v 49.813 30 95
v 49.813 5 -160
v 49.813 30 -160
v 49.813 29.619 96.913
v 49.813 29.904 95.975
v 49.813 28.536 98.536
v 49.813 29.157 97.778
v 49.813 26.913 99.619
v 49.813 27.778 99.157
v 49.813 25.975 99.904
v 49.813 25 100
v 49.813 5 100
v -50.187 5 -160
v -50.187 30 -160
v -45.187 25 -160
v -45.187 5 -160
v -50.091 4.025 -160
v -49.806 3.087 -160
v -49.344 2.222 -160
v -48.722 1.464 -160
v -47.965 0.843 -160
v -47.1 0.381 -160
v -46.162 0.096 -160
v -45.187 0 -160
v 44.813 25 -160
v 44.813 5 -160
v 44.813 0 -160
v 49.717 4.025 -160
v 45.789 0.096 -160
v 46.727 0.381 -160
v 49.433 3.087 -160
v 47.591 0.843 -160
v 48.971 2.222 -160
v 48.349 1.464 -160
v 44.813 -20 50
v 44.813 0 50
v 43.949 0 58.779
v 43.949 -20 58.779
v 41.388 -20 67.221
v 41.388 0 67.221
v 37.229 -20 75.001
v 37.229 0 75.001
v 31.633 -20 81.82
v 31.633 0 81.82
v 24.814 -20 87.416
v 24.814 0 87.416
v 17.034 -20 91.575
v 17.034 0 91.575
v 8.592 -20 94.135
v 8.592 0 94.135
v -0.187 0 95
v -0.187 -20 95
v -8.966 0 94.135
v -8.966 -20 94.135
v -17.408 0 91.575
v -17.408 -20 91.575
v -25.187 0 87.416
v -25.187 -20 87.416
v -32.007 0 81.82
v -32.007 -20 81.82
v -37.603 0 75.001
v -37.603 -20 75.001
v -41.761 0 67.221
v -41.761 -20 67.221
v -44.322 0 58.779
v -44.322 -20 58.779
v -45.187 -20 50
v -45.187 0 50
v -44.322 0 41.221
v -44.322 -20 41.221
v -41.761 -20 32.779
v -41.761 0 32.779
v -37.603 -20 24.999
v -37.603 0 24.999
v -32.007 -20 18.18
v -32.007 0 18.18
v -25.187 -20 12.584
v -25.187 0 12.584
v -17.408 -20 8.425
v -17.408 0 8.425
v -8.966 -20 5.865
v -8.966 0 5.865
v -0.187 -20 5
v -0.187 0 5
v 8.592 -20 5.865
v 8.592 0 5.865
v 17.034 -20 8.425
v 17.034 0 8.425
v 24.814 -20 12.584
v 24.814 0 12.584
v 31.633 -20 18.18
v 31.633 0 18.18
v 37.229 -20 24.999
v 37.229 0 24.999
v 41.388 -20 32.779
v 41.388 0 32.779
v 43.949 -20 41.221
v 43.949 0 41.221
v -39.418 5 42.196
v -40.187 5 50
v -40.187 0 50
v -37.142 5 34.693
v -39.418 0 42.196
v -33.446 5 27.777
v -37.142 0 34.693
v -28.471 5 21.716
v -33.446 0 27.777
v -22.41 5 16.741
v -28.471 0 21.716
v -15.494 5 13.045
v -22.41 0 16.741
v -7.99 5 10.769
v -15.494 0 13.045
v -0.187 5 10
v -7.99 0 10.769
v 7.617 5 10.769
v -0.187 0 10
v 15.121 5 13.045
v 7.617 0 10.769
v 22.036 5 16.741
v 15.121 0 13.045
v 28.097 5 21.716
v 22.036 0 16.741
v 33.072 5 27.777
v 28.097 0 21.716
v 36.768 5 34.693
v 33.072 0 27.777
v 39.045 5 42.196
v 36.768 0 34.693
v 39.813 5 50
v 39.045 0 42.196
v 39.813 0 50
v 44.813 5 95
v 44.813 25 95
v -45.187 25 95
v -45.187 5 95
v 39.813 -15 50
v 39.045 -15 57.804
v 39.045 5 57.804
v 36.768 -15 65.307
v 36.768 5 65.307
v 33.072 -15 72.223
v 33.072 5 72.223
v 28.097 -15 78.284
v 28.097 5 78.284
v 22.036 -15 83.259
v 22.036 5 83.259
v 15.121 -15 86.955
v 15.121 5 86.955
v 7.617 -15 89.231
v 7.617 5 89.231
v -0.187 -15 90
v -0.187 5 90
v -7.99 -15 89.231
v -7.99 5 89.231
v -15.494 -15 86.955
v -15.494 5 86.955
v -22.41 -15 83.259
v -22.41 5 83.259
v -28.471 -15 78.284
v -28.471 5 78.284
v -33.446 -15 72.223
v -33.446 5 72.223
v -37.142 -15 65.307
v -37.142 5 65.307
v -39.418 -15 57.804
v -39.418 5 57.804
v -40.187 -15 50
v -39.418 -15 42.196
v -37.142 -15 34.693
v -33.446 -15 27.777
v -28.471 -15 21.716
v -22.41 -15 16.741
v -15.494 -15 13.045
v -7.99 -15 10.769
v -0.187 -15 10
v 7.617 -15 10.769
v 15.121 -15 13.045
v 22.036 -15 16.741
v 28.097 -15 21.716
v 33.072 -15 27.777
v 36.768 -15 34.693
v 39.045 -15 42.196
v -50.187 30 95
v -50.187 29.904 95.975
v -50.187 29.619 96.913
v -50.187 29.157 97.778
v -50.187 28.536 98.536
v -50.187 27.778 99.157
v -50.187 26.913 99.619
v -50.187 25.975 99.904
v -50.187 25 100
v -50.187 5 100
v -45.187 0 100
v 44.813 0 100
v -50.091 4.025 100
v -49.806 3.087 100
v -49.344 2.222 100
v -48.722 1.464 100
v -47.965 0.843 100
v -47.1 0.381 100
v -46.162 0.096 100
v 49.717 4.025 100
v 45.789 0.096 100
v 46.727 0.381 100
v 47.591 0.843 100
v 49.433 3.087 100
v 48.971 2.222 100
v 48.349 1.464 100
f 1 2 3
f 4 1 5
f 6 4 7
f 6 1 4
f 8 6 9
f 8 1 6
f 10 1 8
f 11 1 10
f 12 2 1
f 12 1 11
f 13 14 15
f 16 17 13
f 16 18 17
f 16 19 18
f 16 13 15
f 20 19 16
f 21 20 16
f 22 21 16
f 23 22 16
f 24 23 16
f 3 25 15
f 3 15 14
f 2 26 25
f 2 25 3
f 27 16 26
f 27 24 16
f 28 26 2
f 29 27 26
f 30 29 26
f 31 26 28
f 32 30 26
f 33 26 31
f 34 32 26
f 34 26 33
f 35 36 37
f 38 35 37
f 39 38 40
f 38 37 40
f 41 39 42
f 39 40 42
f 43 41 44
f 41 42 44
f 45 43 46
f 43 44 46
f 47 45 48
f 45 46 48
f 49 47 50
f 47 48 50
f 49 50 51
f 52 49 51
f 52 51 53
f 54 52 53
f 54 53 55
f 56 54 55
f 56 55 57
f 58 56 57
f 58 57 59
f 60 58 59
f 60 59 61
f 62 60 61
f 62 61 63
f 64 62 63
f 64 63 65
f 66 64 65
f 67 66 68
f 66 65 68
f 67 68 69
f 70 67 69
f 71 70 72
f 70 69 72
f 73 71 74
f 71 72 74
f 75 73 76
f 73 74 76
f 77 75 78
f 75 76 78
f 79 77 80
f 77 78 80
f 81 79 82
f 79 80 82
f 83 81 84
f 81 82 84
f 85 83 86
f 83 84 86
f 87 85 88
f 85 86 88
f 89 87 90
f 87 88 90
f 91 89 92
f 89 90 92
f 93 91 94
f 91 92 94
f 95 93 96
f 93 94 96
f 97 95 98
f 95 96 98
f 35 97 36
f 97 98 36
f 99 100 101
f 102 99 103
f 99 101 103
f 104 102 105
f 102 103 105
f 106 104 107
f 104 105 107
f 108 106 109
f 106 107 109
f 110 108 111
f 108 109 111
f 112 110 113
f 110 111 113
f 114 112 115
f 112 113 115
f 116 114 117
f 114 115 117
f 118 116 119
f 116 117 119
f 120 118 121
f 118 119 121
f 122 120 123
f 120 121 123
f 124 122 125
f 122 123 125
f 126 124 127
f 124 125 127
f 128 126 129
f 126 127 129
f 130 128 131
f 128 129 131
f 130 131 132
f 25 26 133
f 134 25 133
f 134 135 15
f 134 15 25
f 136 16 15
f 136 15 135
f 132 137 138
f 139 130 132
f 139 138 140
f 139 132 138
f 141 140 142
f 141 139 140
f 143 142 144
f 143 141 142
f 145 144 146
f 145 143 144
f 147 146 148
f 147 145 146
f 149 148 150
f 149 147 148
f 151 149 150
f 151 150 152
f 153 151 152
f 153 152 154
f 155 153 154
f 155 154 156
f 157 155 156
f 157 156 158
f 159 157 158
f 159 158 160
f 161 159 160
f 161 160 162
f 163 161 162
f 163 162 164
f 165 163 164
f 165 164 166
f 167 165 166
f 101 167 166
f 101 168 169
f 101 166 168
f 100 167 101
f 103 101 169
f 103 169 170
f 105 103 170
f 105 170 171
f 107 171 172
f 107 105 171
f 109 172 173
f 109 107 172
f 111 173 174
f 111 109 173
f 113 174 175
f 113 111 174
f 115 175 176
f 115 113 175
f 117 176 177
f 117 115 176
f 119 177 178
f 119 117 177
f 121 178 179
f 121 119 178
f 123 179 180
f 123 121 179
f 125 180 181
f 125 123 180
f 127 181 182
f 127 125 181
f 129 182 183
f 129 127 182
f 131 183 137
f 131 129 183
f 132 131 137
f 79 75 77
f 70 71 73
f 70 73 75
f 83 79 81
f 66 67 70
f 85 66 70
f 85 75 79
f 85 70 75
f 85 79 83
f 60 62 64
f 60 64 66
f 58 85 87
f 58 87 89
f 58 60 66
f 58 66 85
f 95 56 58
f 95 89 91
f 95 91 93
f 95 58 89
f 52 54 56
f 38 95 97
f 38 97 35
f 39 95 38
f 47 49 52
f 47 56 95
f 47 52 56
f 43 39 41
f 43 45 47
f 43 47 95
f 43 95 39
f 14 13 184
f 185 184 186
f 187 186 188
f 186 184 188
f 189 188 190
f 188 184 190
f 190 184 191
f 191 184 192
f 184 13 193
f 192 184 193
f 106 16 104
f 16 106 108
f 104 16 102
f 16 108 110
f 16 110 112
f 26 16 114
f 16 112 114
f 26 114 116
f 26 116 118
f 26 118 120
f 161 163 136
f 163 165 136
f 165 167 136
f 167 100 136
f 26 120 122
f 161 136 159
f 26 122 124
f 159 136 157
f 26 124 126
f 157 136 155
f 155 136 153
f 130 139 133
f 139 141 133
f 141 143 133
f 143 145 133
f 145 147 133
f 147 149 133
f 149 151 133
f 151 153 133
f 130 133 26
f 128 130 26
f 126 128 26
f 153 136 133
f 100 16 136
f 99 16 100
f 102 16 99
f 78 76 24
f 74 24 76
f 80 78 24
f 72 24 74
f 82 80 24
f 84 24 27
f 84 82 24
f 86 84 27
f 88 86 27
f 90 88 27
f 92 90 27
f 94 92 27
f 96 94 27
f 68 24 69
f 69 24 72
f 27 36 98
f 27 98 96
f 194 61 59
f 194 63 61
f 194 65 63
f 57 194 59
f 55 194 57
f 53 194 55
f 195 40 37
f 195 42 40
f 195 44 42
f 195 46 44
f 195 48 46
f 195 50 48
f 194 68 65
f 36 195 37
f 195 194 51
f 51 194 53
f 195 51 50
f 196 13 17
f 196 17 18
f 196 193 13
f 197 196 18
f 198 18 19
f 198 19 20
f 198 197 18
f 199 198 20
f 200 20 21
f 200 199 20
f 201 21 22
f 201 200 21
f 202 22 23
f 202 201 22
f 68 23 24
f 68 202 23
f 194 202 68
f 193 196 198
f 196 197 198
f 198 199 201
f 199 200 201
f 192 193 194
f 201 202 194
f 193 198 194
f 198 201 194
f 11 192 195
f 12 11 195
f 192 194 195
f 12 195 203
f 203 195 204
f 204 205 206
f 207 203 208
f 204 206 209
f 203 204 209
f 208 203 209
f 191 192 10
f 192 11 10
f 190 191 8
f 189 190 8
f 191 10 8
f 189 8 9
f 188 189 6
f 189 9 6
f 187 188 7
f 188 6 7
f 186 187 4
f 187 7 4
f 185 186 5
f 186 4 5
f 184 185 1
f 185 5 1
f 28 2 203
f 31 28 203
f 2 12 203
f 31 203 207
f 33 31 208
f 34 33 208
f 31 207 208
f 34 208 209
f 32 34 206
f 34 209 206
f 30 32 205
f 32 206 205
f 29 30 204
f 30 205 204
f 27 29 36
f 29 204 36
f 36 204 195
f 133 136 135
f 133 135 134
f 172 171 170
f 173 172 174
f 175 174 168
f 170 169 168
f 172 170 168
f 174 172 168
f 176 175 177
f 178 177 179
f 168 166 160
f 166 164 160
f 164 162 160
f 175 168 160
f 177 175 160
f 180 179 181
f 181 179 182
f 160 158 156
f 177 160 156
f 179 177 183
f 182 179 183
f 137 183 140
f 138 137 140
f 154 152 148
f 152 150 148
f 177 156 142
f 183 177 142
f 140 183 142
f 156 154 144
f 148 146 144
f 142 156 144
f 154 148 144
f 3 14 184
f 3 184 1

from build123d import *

# Parameters (mm, degrees)
F0_W        = 100
F0_H        = 260
F1_DEPTH    = 30
F3_R        = 5
F2_R        = 45
F4_DEPTH    = 20
F5_T        = 5
F5_T4_ANGLE = 180.000000001
F5_T6_ANGLE = 180.000000001


# Not quite as in the source:
# - a shell that OpenCascade refuses in one call is made with other operations: the cavity is built on its own and cut out


with BuildPart() as f1:
    # F0 (on Front) → F1 (new body)
    with BuildSketch(Plane.XZ):
        with Locations((-0.186801888, -30)):
            Rectangle(F0_W, F0_H)
    extrude(amount=-F1_DEPTH)

    # F3
    f3_edges = [f1.edges().sort_by_distance(p)[0] for p in [
        (49.813198, 0, -30),
        (-50.186802, 0, -30),
        (-0.186802, 30, 100),
    ]]
    fillet(f3_edges, radius=F3_R)

    # F2 (on Front) → F4 (join)
    with BuildSketch(Plane.XZ):
        with Locations((-0.186801888, 50)):
            Circle(F2_R)
    extrude(amount=F4_DEPTH)

    # F5: shell of thickness 5, made by hand


with BuildPart() as f5_core1:
    # F5_t2: copy of F1
    add(f1.part)

    # the walls: a layer under each face that stays
    f5_faces = [f5_core1.faces().sort_by_distance(p)[0] for p in [
        (-0.186801888, 12.5, 100),
        (49.813198112, 17.5, -30),
        (-30.186801888, 0, 91.6666666667),
        (-50.186801888, 17.5, -30),
        (-0.186801888, 30, -32.5),
        (-0.186801888, 0, -55),
        (-45.186801888, -10, 50),
        (-0.186801888, -20, 50),
    ]]
    thicken(f5_faces, amount=-F5_T, mode=Mode.SUBTRACT)

    # F5_s3 → F5_t4 (revolve, cut)
    with BuildSketch(Plane.XY.offset(50)):
        Polygon((44.863198112, -0.05), (44.813198112, 5), (39.813198112, 5), (39.813198112, 0), align=None)
    revolve(axis=Axis((-0.186801888, 0, 50), (0, -1, 0)), revolution_arc=F5_T4_ANGLE, mode=Mode.SUBTRACT)

    # F5_s5 → F5_t6 (revolve, cut)
    with BuildSketch(Plane.XY.offset(50)):
        Polygon((-45.236801888, -0.05), (-45.186801888, 5), (-40.186801888, 5), (-40.186801888, 0), align=None)
    revolve(axis=Axis((-0.186801888, 0, 50), (0, -1, 0)), revolution_arc=F5_T6_ANGLE, mode=Mode.SUBTRACT)


with BuildPart() as f1_1:
    add(f1.part)

    # what is left inside the walls is the cavity
    f5_cavity = [f5_core1.part.solids().sort_by_distance(p)[0] for p in [
        (-0.186802, 24.95, -75),
    ]]
    add(f5_cavity, mode=Mode.SUBTRACT)


solid = f1_1.part
